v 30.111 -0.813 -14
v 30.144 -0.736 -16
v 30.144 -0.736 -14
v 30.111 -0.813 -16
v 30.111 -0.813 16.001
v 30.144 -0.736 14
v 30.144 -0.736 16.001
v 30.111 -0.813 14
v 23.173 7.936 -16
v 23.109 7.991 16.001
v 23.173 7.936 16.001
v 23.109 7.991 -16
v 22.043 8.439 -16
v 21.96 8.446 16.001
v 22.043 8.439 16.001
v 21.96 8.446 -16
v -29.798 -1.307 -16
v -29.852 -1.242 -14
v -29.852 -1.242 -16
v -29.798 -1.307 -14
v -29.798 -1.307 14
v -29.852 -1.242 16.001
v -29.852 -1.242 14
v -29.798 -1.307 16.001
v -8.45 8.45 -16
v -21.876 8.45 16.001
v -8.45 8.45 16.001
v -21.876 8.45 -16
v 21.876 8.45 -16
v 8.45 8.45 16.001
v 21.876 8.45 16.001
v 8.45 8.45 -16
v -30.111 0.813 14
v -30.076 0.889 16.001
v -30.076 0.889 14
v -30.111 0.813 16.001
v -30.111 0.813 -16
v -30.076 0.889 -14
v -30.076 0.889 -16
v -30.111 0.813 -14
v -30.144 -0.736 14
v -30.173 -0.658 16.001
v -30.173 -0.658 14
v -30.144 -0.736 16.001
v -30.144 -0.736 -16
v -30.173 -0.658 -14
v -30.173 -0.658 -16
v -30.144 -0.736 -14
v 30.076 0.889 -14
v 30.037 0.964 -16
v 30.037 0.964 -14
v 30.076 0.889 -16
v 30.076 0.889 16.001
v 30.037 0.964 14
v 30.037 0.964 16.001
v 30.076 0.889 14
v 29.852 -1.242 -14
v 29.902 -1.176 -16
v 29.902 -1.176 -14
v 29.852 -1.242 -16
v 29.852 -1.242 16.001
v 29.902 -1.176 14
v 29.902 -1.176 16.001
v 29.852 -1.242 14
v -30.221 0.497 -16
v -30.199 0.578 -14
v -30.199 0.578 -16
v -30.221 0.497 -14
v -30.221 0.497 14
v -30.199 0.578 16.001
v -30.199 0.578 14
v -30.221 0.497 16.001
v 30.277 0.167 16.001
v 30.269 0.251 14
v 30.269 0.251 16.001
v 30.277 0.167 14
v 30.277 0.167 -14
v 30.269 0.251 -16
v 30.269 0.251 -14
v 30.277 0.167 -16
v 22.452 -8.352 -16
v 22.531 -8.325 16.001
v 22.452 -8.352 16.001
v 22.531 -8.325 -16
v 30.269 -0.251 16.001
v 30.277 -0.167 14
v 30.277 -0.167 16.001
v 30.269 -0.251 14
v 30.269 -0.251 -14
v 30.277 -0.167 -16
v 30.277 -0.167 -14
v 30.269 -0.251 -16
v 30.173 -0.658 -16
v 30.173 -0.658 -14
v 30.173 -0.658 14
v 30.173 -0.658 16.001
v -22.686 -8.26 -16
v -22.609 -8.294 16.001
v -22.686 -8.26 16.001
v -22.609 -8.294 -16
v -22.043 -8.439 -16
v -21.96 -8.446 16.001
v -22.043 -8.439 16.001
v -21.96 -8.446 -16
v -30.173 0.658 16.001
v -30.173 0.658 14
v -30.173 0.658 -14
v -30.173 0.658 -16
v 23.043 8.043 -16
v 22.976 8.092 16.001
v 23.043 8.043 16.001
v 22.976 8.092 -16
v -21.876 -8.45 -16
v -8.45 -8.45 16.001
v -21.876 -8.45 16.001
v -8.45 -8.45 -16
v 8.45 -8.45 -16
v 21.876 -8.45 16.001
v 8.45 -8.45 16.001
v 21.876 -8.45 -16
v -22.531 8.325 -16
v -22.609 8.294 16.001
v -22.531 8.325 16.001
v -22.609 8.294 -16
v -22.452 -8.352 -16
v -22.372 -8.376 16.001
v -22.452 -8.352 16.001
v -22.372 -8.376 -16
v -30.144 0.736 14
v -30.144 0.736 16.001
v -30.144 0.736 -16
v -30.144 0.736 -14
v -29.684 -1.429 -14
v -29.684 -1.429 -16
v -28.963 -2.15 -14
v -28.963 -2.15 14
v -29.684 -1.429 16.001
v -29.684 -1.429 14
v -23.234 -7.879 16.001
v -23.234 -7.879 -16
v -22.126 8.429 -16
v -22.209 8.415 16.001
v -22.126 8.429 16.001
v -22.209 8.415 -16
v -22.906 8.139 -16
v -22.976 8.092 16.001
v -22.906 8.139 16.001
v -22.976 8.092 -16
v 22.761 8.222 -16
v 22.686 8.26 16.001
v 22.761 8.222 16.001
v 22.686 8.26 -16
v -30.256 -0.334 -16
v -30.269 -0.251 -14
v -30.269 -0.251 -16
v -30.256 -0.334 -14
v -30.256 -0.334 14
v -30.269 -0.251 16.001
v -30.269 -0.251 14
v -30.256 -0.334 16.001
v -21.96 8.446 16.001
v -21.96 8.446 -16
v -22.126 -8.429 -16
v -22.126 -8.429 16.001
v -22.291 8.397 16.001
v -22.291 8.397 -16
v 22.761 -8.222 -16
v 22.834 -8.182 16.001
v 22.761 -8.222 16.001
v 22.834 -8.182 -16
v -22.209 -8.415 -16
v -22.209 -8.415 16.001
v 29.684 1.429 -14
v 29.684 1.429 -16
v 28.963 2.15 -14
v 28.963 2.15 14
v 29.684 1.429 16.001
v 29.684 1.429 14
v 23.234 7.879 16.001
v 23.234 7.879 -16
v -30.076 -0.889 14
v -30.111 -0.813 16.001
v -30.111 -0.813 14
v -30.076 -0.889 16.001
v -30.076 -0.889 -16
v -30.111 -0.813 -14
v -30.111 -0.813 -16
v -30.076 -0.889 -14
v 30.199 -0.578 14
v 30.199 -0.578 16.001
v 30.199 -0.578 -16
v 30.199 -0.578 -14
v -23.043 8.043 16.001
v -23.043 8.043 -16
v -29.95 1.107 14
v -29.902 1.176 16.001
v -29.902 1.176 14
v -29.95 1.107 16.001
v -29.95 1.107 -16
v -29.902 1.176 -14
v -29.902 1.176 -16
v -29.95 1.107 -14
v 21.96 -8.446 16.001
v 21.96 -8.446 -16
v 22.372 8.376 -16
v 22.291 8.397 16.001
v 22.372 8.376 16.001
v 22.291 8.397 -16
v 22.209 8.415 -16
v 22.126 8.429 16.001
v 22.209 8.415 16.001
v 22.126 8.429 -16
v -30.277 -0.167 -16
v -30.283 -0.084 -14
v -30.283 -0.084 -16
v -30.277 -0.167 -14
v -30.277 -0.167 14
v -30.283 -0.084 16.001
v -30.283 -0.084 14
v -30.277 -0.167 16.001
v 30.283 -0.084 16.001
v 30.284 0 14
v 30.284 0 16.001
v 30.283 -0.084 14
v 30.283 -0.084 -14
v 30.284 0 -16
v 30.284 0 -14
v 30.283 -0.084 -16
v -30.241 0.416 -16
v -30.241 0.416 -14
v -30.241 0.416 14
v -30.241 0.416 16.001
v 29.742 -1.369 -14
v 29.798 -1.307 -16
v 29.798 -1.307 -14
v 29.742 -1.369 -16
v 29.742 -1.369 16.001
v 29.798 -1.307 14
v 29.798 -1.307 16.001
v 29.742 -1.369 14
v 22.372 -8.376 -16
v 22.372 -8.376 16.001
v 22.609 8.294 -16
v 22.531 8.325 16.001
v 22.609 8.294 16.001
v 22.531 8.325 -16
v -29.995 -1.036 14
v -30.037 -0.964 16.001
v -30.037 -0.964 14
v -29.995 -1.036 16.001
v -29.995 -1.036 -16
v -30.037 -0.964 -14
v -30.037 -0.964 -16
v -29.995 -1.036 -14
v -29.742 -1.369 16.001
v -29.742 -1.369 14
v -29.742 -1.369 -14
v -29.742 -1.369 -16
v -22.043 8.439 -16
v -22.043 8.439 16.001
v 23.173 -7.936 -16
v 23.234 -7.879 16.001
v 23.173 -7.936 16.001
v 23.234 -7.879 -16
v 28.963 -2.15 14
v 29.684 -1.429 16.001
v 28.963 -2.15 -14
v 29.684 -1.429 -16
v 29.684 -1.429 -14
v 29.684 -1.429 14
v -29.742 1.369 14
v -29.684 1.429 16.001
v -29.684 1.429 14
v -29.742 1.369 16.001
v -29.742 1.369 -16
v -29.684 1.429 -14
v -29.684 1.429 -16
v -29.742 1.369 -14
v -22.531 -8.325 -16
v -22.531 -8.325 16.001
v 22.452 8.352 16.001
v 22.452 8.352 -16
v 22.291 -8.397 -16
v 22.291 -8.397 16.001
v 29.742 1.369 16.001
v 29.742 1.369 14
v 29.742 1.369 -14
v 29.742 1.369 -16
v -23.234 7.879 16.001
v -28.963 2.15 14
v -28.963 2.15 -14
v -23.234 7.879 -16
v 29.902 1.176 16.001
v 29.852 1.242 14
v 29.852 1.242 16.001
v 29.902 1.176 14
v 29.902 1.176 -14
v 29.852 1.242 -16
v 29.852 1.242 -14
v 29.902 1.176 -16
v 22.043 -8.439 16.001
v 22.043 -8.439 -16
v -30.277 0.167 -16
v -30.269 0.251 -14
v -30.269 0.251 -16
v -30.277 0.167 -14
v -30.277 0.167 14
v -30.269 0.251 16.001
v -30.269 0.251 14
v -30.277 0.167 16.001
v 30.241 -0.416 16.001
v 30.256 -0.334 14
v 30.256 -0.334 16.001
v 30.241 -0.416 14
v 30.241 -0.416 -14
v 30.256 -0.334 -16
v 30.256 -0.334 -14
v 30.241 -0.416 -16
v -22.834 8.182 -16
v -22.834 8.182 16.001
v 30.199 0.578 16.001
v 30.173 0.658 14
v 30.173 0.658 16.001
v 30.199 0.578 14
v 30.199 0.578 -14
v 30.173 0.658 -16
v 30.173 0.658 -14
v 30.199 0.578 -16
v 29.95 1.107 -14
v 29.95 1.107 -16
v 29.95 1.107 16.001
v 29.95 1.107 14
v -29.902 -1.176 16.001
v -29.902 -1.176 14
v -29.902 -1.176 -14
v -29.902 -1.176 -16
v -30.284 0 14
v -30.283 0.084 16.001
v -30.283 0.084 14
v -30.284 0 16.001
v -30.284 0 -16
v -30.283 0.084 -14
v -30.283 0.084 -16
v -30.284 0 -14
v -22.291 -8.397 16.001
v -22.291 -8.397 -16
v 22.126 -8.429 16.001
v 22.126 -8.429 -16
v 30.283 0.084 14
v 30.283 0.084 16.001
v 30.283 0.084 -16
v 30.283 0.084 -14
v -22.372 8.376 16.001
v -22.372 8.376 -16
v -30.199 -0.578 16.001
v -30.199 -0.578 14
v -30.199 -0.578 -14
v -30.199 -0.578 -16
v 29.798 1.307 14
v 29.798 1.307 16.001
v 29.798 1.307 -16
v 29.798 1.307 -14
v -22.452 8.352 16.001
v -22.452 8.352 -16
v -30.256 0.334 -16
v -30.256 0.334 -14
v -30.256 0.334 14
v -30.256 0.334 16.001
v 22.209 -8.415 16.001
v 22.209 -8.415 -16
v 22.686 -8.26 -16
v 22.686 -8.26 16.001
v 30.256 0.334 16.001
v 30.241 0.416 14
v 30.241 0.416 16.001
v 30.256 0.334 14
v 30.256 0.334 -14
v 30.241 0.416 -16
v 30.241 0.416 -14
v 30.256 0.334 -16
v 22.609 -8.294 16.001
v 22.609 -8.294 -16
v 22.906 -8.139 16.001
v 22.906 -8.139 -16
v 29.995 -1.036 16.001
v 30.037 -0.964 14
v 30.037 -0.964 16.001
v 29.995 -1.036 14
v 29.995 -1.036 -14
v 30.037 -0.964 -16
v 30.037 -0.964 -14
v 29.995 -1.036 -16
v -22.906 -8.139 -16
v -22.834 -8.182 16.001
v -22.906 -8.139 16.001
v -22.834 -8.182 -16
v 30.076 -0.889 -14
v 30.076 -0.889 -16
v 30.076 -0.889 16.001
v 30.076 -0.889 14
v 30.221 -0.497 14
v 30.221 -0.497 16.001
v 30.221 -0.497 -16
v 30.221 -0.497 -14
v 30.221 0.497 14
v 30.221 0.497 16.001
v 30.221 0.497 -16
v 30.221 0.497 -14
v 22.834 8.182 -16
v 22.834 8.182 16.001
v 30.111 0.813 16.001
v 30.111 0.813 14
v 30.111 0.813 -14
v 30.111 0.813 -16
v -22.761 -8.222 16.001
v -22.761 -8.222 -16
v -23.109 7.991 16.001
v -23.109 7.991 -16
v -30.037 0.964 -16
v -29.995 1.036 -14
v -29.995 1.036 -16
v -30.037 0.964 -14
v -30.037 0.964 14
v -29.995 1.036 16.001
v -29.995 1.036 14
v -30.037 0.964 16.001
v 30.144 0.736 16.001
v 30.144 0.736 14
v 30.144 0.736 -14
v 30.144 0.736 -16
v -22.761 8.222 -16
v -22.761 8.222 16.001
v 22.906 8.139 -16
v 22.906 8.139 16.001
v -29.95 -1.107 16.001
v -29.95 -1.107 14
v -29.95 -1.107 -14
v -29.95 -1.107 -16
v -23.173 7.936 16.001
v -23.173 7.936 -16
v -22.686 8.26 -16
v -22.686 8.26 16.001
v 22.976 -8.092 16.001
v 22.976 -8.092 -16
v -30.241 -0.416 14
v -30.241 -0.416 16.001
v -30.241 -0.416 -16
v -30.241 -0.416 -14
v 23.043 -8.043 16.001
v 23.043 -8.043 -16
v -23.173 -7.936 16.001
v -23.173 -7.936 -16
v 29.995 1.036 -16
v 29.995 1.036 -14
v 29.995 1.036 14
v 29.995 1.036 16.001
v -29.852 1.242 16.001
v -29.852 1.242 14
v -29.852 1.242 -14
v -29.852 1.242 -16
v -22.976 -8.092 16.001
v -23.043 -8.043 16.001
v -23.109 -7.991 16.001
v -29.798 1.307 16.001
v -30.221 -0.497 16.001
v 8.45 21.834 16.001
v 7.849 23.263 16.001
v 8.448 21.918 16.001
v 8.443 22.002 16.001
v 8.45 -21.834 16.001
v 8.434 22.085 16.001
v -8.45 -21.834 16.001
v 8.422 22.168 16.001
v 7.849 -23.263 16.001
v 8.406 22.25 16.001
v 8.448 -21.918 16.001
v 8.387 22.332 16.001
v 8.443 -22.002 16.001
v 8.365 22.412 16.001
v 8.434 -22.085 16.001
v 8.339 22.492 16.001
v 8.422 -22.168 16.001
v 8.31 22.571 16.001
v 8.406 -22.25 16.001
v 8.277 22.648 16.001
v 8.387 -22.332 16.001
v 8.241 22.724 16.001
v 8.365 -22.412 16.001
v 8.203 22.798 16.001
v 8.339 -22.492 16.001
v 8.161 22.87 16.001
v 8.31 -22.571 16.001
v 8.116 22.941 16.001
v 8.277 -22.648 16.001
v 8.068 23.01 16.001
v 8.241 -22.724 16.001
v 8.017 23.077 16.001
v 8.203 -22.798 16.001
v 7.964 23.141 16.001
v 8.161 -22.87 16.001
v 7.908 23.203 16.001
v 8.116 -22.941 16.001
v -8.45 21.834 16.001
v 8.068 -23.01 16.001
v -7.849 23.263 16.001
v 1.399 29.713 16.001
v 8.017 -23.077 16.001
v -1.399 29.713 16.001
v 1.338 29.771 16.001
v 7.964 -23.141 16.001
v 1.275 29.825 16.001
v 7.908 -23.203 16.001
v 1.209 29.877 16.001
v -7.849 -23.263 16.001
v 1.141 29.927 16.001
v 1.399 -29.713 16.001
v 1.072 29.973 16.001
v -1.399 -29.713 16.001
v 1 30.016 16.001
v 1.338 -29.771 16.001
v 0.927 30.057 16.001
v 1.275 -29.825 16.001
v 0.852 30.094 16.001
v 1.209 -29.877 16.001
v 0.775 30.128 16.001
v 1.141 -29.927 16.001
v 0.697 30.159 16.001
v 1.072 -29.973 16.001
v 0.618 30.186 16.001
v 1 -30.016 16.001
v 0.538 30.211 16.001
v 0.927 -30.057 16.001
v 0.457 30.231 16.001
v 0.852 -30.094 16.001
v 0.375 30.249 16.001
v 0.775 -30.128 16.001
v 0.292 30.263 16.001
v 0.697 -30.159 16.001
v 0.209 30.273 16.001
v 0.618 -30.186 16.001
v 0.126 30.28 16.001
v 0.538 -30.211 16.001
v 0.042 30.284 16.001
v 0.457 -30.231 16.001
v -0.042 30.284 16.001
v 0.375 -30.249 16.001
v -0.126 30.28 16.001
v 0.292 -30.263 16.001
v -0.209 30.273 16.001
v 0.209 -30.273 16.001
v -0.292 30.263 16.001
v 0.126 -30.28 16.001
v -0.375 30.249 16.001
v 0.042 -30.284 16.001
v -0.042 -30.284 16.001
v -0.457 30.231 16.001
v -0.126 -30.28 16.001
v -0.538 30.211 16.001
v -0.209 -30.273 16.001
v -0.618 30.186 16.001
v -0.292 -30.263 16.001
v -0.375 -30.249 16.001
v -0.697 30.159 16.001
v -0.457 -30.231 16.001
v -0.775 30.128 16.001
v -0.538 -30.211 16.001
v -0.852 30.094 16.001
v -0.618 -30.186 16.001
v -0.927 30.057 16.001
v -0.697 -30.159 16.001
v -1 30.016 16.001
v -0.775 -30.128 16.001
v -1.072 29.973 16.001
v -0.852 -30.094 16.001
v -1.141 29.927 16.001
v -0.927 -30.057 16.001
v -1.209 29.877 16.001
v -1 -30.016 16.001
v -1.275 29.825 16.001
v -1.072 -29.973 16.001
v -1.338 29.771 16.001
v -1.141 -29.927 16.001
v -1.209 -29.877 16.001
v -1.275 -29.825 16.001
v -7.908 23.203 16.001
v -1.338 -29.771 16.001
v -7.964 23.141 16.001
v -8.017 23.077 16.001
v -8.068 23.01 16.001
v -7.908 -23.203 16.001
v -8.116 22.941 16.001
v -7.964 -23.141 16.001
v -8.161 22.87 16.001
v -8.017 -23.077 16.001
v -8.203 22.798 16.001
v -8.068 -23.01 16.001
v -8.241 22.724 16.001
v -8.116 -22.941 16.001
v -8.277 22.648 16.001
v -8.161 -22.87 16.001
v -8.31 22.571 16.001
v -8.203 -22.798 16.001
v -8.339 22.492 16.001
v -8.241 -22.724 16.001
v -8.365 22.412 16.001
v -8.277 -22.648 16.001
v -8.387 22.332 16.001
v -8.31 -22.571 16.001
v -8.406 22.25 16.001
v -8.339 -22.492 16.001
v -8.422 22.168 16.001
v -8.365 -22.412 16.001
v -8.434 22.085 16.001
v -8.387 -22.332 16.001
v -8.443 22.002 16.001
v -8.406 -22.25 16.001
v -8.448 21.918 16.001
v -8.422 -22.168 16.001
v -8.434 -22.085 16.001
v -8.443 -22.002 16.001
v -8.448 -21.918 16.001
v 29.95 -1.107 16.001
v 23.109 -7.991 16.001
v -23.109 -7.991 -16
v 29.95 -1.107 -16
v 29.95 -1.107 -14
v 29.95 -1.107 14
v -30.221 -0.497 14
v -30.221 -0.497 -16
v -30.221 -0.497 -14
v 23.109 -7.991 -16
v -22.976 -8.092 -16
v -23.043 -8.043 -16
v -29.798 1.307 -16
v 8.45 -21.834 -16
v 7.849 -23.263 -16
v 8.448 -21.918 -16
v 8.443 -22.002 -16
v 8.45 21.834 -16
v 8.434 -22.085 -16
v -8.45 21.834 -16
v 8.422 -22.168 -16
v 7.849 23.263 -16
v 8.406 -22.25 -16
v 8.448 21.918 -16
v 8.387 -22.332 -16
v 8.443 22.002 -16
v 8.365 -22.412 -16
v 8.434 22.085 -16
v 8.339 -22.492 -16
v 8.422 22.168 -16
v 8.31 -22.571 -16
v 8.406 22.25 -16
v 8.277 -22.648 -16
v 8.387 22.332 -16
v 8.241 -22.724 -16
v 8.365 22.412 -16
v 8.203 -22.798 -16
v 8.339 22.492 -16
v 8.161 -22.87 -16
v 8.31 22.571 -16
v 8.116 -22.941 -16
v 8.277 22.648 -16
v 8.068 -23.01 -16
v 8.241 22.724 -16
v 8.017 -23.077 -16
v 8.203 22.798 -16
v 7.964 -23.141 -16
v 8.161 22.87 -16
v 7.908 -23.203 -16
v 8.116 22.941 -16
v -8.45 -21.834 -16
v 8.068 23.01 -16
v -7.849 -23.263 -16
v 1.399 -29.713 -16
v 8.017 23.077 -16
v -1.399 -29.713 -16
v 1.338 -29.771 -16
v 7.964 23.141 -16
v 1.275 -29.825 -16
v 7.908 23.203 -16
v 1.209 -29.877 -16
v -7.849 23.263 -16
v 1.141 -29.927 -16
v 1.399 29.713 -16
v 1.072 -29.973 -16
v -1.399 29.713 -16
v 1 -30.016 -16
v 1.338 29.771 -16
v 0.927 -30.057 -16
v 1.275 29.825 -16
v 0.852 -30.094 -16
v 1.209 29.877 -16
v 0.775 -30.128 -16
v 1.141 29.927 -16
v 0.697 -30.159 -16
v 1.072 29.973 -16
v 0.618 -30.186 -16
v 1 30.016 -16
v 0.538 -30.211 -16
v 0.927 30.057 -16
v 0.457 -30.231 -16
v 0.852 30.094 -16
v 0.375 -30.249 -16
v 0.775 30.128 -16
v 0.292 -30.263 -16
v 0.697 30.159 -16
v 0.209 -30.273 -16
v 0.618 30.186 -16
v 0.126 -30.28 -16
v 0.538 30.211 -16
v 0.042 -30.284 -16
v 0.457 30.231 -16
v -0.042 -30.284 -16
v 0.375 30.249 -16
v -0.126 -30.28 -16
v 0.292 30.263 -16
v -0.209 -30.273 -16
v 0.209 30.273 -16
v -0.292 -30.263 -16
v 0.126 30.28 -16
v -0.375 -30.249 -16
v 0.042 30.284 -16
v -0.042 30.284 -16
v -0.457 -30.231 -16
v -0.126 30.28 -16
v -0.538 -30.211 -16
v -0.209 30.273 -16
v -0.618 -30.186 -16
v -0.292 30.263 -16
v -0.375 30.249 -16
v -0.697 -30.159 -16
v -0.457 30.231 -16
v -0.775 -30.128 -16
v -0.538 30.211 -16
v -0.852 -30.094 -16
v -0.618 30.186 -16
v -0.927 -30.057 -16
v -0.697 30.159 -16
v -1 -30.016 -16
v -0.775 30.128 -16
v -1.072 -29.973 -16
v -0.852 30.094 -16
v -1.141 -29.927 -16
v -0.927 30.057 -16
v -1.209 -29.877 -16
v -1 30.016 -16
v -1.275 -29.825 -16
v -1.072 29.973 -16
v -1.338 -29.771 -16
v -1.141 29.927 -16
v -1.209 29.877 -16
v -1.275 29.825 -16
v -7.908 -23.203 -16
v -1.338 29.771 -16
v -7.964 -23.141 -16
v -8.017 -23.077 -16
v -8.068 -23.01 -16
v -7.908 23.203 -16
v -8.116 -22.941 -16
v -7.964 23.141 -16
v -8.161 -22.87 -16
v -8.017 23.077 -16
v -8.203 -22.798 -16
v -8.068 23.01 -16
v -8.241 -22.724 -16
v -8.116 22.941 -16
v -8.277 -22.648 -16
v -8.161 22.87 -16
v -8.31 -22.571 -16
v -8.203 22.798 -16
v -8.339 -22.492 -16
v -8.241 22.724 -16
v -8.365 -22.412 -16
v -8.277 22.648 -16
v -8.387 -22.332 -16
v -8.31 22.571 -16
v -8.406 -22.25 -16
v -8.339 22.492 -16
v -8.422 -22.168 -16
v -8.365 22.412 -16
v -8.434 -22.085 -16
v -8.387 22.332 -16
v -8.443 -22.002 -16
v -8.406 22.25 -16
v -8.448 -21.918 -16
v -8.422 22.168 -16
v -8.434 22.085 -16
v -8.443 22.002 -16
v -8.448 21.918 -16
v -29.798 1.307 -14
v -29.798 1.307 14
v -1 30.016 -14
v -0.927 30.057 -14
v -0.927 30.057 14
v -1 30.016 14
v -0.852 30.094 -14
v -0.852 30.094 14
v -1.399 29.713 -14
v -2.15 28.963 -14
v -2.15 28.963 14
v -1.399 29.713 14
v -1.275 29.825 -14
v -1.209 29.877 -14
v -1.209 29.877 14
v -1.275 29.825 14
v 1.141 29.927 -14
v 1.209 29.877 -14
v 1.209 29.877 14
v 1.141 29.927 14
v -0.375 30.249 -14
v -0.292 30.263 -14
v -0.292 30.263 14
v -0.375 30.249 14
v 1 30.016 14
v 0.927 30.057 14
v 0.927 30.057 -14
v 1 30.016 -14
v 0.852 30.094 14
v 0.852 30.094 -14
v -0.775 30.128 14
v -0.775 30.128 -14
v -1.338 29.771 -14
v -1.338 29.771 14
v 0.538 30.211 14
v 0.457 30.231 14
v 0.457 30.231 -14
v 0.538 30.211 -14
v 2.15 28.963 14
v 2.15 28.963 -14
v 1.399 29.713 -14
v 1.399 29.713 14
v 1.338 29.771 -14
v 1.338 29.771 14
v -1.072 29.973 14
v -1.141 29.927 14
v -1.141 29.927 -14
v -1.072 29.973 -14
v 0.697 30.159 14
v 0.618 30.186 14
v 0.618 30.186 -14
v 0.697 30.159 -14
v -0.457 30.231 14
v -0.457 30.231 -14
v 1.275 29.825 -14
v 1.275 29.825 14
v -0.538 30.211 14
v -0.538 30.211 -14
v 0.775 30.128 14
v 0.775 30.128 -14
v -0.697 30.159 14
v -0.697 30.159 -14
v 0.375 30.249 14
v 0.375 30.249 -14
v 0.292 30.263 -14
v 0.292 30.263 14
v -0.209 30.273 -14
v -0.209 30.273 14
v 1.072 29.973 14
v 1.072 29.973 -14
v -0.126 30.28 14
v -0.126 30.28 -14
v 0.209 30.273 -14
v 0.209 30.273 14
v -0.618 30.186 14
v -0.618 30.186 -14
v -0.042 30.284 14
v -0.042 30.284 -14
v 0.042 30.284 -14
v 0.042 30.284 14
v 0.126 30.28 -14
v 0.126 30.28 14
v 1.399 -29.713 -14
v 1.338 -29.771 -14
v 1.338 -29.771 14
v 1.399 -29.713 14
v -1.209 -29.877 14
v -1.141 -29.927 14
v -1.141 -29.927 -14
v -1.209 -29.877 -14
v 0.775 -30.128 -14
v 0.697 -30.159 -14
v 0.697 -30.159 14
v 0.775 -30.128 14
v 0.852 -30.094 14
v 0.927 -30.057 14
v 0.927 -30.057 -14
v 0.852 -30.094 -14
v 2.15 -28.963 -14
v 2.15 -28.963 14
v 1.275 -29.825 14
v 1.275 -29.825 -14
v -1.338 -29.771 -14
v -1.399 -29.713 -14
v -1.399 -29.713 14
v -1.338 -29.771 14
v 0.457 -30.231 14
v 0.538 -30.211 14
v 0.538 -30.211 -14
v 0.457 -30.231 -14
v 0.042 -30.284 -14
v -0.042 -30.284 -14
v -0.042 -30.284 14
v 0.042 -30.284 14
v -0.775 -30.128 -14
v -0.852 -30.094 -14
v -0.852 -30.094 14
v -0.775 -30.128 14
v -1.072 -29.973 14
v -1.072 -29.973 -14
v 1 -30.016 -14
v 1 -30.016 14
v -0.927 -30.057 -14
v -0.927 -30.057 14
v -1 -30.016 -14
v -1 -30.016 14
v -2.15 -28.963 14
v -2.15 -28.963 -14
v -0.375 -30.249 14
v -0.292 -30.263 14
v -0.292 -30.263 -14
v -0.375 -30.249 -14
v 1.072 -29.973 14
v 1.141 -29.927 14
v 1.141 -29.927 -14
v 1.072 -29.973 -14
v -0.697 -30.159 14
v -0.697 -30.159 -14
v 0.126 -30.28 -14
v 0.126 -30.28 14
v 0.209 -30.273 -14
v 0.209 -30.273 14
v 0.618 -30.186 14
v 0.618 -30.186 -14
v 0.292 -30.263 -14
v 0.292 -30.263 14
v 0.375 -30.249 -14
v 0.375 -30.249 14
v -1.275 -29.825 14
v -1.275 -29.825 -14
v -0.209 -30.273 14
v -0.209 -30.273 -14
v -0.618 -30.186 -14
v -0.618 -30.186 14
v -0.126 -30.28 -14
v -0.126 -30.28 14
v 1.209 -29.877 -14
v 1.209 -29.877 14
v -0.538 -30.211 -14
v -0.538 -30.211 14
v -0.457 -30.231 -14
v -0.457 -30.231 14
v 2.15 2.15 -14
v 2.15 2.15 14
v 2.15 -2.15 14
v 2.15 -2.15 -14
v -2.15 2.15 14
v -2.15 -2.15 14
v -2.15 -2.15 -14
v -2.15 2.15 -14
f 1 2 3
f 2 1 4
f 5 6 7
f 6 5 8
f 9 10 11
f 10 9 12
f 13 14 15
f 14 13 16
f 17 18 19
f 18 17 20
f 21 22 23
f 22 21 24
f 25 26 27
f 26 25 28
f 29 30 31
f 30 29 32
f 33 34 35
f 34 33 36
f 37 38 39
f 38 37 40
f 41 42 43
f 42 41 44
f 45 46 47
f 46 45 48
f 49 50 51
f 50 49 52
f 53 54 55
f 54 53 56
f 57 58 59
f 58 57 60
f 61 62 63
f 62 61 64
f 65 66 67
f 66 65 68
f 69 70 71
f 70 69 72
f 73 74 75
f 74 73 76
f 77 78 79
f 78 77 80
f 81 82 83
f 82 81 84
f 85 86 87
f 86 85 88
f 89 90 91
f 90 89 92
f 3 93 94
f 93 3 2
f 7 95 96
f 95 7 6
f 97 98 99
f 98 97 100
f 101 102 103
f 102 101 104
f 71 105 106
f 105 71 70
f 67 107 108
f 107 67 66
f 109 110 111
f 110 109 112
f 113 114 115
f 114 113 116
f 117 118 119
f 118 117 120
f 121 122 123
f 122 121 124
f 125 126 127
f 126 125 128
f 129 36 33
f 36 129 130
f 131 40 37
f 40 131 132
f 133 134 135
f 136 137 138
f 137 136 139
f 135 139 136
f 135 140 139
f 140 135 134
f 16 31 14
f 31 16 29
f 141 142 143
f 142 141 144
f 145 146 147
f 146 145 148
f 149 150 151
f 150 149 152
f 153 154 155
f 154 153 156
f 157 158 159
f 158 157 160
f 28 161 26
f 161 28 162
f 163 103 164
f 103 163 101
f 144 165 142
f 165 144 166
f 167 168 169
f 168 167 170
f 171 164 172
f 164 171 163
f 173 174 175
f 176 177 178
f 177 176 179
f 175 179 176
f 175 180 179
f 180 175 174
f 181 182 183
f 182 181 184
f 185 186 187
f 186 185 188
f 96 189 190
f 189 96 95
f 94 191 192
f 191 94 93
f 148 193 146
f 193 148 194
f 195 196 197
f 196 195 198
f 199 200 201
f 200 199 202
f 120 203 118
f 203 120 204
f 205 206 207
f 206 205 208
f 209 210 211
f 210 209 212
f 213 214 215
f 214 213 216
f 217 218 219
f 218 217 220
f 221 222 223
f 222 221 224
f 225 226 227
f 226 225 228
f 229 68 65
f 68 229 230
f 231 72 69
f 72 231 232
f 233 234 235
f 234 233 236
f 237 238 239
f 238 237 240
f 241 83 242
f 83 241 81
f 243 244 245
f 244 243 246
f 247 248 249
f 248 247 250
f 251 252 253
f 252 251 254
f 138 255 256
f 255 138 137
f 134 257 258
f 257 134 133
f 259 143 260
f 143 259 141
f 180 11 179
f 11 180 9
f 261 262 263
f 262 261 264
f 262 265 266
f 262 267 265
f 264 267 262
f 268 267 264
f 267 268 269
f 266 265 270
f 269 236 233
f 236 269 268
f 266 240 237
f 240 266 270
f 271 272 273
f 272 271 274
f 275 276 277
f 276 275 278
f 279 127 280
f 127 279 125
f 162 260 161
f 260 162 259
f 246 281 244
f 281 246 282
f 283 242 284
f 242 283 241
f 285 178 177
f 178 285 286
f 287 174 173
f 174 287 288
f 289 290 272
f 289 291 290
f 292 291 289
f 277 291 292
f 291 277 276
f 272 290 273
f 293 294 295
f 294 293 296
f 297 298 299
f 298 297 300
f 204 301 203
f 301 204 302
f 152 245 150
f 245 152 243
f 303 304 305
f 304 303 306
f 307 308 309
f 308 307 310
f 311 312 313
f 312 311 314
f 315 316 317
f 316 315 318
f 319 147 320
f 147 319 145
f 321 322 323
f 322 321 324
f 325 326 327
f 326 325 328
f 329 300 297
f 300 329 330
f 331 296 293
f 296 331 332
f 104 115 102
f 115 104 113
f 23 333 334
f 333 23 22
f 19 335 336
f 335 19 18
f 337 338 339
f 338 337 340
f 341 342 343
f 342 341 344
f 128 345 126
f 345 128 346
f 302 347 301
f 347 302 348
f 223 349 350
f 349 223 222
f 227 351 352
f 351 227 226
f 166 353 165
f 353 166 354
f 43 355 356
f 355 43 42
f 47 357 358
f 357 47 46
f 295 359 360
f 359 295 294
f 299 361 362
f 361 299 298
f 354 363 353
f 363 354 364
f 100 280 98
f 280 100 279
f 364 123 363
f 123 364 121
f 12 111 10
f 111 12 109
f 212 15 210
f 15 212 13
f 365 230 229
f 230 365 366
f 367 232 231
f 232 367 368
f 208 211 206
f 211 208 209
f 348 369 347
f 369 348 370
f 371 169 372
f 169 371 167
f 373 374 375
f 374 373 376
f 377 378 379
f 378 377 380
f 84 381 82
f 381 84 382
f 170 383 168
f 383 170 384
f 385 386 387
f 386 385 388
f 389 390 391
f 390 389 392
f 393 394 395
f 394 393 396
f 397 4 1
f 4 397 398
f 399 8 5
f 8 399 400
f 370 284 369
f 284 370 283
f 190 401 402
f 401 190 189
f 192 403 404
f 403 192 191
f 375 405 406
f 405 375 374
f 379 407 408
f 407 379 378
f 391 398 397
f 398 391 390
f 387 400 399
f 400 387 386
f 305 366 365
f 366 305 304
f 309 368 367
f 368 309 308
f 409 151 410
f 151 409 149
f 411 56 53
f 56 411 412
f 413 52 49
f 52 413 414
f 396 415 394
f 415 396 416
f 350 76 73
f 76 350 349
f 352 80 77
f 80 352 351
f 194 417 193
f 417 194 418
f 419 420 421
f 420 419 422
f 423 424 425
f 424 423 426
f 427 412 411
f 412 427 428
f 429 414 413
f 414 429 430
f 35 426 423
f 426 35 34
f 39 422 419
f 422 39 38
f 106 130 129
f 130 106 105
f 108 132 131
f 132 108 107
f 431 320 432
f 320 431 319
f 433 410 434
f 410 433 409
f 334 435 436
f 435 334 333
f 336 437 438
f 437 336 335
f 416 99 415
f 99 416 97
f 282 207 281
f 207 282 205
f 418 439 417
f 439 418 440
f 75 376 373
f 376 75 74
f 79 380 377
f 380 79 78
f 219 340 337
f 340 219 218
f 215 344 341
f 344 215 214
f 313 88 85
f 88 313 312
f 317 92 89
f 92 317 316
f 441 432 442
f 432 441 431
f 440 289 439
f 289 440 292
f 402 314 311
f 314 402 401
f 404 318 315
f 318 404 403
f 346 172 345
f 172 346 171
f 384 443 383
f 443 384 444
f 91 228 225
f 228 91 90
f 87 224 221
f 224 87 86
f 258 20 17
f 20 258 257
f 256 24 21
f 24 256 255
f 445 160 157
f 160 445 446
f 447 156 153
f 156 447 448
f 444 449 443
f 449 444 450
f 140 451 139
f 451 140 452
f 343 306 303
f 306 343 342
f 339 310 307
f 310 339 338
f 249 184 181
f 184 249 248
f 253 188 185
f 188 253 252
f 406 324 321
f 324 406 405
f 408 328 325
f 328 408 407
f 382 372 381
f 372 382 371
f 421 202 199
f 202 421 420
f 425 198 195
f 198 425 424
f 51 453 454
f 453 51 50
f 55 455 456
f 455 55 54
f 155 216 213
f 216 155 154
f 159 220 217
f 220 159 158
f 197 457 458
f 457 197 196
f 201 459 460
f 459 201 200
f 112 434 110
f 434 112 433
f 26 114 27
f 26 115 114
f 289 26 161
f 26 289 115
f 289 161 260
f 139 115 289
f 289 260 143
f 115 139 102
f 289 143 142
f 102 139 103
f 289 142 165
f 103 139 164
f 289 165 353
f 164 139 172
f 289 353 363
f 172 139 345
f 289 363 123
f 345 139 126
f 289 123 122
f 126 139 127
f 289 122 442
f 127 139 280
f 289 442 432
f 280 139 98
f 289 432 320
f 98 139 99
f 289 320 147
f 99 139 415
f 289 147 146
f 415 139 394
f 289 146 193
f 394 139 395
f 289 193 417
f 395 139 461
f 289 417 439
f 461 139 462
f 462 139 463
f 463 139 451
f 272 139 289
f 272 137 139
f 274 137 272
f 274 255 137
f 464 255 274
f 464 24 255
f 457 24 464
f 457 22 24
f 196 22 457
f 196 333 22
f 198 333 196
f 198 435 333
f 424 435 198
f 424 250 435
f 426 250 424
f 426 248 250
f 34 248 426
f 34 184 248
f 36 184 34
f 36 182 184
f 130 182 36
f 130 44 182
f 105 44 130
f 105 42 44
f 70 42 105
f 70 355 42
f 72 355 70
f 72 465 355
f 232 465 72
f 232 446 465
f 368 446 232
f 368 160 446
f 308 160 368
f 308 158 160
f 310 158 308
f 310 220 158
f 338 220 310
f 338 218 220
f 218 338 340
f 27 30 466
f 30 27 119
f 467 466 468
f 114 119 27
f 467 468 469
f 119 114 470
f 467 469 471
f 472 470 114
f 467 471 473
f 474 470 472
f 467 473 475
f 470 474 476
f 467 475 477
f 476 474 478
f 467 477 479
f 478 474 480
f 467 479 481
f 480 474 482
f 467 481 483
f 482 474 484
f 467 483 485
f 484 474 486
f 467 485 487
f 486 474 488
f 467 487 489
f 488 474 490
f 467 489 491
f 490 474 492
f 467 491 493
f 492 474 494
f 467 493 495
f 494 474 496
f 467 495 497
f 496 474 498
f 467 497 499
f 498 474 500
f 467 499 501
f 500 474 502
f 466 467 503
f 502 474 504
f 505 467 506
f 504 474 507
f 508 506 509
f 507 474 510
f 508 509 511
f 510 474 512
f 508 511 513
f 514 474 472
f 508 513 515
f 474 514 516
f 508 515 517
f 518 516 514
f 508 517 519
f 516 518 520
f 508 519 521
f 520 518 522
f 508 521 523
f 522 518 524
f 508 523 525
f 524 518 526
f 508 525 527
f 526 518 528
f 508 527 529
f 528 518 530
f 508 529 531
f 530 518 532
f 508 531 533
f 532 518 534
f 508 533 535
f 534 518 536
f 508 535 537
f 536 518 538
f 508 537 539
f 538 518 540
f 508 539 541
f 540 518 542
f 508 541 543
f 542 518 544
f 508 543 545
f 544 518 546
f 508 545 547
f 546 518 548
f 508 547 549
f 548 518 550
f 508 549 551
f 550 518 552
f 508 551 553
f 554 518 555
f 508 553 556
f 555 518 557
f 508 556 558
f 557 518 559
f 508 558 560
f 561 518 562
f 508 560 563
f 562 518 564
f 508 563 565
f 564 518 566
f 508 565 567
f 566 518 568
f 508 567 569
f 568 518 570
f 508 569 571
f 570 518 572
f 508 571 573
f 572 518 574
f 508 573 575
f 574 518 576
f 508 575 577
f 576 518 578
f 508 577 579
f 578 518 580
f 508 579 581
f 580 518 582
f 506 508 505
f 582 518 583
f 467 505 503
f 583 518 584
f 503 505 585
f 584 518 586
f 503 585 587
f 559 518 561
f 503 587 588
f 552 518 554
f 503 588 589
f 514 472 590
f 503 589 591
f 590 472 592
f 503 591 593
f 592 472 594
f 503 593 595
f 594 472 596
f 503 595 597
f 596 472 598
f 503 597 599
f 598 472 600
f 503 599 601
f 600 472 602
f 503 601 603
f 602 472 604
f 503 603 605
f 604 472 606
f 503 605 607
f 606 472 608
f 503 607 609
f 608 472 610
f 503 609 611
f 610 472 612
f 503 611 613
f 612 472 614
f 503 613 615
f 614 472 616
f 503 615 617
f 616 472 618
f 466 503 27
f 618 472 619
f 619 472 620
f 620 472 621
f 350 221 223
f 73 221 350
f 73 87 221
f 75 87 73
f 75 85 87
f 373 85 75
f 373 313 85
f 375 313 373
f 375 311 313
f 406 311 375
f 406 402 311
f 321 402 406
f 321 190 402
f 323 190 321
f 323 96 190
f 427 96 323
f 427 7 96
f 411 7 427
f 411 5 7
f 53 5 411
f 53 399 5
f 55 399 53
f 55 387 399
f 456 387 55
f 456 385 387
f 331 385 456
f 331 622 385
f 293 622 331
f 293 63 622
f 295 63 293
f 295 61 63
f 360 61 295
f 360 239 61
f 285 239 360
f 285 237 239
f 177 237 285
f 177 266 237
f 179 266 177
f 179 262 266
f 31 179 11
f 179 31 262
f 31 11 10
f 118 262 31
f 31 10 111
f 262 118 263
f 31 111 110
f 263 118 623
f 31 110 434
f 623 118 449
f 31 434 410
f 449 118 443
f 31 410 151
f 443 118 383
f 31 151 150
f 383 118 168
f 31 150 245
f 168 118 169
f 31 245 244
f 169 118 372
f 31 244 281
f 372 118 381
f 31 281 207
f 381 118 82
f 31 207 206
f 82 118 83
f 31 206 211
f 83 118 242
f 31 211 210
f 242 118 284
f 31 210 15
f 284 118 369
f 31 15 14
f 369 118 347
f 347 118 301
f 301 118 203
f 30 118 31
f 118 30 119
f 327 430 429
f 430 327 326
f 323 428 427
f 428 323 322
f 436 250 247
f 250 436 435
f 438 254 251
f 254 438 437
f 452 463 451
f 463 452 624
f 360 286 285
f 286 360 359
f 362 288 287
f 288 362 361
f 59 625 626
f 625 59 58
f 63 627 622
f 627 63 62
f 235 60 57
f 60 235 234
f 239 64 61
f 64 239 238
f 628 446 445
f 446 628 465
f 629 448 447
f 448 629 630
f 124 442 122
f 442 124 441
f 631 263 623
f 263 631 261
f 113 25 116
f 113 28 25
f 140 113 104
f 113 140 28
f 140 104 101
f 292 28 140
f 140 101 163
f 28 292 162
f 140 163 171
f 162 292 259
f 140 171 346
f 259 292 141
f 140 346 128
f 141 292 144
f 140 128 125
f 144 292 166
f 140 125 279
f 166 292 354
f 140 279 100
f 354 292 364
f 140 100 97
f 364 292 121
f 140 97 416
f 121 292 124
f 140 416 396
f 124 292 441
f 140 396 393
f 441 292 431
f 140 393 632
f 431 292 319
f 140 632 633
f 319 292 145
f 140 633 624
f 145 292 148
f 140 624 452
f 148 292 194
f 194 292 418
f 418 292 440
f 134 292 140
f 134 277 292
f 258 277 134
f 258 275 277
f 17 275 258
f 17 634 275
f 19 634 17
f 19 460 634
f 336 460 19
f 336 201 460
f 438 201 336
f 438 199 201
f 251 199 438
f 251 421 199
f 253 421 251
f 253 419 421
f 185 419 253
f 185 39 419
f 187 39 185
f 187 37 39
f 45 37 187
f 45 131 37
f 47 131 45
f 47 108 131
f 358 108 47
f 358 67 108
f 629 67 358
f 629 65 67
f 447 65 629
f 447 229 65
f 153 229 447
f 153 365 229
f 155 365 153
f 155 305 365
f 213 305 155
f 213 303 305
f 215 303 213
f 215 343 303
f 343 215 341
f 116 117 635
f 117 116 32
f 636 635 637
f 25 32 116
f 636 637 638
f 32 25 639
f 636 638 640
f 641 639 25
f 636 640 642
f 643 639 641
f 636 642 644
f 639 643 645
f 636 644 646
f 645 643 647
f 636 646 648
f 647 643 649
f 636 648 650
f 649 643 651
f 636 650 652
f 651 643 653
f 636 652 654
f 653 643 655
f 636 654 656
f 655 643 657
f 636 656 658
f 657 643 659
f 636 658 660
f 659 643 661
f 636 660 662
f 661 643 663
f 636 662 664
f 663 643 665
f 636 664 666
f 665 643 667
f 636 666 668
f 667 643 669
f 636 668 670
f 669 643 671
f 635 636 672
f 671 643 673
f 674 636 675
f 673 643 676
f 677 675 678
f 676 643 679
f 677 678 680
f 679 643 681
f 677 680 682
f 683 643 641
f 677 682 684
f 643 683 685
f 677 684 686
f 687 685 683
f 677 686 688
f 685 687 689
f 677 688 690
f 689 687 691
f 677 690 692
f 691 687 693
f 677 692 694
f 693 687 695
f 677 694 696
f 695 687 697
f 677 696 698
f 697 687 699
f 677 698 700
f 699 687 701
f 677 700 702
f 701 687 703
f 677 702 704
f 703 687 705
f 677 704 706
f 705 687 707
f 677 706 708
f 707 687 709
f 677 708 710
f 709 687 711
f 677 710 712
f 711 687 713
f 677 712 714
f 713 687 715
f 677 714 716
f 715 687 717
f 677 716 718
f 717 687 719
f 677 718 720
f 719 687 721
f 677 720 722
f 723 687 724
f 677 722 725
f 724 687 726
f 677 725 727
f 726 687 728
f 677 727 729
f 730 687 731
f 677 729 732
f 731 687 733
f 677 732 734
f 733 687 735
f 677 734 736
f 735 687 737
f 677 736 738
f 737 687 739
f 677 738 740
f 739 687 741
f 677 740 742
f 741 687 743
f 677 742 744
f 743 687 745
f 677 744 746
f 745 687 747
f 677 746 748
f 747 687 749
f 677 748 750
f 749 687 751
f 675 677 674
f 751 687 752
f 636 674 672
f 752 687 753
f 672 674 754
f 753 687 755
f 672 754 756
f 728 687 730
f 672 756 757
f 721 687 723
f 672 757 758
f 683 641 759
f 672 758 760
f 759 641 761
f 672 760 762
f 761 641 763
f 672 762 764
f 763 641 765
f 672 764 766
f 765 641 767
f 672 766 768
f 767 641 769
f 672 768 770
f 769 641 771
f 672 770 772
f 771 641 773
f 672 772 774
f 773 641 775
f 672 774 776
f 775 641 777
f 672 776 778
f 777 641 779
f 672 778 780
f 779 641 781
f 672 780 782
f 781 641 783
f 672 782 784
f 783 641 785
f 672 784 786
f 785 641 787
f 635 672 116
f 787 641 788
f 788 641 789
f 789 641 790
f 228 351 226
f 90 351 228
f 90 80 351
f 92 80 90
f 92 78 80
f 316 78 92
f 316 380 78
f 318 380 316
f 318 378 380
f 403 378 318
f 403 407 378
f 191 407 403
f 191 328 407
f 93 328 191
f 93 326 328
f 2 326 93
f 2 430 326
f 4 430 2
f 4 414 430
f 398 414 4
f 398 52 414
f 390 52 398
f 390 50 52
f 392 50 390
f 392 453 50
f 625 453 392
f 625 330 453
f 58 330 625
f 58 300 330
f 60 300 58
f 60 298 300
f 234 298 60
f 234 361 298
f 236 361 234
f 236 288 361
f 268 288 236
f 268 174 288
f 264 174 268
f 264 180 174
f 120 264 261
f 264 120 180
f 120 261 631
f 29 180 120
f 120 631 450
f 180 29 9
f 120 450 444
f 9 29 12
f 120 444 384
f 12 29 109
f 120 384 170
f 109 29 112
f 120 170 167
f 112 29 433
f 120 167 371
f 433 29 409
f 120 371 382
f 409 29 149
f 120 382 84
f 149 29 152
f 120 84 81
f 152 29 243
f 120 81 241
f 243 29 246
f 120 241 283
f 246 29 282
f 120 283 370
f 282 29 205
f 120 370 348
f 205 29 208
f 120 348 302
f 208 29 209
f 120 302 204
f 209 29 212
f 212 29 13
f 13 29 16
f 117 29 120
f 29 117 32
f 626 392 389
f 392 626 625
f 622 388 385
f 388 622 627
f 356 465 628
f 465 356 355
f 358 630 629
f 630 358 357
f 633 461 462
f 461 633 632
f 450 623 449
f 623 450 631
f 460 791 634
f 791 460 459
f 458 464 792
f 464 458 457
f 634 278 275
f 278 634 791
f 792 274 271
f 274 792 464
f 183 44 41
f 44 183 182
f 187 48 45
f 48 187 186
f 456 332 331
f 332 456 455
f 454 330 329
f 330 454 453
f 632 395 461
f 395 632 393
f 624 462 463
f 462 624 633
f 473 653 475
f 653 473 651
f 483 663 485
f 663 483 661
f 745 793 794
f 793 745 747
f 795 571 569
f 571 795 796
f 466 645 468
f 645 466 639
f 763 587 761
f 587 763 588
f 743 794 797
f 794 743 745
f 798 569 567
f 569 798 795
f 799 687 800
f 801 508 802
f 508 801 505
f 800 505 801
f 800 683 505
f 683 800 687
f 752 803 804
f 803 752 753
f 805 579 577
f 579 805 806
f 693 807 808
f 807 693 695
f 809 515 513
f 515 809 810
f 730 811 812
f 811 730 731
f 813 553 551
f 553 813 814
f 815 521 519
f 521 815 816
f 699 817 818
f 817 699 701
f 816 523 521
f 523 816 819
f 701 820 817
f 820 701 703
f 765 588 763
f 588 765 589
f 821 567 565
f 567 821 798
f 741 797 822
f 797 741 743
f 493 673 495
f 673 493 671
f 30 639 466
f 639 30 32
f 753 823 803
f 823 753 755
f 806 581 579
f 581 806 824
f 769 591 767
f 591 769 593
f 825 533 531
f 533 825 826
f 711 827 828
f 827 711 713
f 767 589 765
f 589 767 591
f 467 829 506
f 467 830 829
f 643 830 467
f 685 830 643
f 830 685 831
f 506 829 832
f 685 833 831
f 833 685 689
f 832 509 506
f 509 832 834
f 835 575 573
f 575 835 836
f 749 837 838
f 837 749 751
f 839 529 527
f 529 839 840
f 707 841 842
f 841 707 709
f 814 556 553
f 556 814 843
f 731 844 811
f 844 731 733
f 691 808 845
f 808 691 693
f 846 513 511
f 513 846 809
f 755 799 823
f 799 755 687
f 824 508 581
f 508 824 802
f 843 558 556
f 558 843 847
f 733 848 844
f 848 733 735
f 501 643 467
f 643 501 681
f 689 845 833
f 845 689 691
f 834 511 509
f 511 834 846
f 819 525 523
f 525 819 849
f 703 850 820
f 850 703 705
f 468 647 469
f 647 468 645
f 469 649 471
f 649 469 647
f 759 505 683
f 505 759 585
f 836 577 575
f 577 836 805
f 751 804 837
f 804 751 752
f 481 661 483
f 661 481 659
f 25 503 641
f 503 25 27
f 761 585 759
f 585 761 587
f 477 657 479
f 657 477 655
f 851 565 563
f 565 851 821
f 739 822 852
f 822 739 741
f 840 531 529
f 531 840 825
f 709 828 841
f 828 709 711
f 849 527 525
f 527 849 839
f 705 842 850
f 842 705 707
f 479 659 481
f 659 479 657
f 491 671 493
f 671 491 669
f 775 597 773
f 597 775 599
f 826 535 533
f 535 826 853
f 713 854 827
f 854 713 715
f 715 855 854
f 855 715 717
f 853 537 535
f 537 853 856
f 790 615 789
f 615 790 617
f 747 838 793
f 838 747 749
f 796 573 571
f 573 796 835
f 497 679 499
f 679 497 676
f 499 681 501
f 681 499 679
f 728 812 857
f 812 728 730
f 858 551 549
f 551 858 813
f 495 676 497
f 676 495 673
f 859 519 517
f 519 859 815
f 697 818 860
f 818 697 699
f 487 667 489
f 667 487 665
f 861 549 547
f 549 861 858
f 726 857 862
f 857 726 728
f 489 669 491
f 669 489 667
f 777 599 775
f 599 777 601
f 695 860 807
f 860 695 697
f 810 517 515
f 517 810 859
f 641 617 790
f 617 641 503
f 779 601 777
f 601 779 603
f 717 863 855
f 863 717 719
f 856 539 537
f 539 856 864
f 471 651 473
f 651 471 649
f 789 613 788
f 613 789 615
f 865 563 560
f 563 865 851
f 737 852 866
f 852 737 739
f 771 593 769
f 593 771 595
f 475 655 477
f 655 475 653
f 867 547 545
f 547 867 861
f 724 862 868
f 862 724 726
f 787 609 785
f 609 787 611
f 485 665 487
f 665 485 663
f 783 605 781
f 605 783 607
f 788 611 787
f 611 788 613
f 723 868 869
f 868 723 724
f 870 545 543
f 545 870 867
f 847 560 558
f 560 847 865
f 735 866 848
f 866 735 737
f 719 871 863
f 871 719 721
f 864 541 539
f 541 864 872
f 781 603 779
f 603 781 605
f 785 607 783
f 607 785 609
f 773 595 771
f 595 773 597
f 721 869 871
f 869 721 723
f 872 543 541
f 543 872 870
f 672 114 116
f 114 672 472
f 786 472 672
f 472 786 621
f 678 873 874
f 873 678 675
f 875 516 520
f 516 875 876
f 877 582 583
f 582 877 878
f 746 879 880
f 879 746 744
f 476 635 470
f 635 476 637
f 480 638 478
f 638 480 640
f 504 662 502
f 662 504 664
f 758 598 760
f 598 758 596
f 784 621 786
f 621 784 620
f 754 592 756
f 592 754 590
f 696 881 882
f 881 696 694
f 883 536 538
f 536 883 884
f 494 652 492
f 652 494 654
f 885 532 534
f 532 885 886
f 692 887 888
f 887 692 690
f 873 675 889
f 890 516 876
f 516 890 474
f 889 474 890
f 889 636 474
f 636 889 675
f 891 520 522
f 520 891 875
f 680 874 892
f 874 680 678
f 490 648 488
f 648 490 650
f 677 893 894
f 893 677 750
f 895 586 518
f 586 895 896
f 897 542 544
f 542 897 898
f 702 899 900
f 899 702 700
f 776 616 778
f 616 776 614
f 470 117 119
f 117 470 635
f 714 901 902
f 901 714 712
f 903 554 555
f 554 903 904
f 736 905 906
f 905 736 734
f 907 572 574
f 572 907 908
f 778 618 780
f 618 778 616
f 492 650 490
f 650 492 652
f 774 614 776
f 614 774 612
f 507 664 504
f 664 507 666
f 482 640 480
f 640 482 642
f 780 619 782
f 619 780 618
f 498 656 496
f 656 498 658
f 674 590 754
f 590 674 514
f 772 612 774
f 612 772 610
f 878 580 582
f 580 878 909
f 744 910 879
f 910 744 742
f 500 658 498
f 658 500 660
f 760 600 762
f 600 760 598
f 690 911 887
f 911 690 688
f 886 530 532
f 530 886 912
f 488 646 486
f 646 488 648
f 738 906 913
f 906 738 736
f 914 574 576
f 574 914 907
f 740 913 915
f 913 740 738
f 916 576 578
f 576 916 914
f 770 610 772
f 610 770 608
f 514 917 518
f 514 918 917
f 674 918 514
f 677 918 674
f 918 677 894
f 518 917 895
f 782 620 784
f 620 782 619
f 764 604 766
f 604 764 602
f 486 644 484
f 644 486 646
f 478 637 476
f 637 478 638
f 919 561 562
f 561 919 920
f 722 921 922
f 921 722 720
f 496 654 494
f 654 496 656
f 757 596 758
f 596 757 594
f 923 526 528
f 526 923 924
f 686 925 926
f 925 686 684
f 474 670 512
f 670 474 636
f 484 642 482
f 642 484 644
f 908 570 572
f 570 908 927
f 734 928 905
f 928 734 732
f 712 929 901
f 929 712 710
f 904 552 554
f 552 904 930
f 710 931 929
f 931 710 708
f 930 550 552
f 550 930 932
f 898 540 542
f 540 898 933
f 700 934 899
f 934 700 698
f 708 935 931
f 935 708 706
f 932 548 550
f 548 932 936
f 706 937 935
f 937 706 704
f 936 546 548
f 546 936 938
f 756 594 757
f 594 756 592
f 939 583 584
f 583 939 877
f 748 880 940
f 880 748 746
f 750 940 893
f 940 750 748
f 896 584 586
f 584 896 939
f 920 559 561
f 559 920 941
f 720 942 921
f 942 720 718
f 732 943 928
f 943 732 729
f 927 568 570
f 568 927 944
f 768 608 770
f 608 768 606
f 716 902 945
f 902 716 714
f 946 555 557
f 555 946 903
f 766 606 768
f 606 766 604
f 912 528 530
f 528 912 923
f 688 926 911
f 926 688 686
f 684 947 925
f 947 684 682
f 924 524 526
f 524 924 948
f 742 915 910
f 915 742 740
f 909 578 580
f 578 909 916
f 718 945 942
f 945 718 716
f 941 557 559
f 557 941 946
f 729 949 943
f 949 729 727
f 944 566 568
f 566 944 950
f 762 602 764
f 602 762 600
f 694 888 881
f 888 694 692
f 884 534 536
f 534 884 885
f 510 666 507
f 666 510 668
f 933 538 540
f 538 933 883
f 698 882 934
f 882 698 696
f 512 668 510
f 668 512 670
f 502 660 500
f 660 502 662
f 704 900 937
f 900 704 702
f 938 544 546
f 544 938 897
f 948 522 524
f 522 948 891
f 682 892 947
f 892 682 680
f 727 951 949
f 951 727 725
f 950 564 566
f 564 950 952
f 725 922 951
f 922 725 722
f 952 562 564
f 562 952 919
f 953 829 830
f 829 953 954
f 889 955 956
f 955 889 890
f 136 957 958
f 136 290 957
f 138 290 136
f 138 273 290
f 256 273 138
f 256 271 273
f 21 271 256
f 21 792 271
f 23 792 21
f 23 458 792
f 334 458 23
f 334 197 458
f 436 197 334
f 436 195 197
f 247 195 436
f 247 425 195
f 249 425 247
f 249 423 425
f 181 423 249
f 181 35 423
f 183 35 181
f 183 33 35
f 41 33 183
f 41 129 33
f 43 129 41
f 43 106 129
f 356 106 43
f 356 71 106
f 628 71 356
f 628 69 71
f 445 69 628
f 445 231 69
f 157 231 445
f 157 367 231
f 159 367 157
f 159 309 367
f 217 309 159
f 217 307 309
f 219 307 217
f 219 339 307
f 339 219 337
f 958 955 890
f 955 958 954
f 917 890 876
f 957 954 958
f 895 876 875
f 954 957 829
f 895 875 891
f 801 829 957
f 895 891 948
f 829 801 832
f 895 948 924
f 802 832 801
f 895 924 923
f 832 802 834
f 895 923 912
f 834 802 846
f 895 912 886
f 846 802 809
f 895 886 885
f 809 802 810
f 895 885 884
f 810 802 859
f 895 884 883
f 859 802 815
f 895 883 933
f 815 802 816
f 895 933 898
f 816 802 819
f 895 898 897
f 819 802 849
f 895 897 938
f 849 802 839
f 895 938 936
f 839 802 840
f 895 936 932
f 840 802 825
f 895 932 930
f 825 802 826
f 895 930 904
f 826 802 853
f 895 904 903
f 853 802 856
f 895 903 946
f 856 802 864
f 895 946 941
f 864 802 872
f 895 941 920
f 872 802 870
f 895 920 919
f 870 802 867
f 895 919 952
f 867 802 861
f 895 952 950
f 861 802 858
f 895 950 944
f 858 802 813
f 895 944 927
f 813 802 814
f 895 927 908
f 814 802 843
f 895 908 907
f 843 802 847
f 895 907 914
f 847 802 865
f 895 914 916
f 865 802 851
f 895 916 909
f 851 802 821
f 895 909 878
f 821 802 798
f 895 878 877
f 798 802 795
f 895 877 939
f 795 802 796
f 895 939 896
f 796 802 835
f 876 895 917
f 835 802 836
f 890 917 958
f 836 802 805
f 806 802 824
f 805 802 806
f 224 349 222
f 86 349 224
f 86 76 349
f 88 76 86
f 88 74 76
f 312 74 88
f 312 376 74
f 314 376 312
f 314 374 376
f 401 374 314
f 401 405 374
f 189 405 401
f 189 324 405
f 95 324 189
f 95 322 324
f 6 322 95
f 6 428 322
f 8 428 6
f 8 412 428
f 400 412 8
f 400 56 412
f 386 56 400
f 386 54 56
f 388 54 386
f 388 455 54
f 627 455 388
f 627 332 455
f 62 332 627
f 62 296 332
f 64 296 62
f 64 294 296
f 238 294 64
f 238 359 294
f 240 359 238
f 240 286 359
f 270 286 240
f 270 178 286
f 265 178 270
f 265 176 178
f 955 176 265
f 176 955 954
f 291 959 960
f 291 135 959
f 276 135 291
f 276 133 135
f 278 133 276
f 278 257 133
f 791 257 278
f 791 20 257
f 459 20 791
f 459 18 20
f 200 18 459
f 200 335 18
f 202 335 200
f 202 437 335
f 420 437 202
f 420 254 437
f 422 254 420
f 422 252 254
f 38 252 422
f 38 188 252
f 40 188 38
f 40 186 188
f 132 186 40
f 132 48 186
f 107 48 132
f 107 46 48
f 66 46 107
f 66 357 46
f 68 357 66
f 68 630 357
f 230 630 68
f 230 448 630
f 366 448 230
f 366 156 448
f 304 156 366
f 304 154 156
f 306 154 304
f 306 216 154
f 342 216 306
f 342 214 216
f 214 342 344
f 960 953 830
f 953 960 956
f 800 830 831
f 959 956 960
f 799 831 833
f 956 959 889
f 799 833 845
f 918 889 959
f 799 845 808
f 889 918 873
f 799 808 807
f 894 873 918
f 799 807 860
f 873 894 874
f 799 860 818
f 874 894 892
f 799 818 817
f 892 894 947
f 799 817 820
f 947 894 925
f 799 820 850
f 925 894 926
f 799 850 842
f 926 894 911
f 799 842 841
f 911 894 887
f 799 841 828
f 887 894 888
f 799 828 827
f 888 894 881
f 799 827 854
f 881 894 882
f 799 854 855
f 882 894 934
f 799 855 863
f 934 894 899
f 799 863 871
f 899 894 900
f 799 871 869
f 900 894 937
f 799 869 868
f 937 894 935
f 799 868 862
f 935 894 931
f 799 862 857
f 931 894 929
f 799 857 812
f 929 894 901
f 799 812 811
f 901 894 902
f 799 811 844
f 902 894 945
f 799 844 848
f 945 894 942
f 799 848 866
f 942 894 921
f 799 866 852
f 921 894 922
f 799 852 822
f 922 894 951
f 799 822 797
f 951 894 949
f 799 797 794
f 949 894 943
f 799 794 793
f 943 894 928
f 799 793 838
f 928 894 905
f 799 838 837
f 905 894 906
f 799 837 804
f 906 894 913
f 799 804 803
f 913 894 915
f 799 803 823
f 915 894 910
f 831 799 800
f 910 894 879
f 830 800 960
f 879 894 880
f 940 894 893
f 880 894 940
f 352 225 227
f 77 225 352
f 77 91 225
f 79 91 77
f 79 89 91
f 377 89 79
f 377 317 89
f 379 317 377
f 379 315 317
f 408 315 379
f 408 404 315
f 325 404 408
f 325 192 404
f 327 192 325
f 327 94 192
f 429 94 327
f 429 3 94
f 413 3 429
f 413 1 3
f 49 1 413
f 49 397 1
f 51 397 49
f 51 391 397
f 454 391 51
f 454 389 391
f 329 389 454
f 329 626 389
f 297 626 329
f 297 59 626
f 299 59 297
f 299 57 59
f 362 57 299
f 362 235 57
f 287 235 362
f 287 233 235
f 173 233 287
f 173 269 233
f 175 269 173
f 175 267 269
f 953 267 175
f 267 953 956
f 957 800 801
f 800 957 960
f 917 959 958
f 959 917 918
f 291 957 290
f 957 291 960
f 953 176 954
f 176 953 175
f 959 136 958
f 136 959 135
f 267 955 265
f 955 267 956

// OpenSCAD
//Yardstick/ruler loop antenna center
$fn = ($preview)?25:150;


body_side = 40;
plate_thickness = 2; 

slot_width = 4.3;
slot_depth = 28;


fillet = 2;

difference() {
	minkowski() {
		difference() {
			rotate(45, [0,0,1]) {
				cube([body_side, body_side, slot_depth + 2*plate_thickness], center = true);
			}
			for(angle = [0, 90, 180, 270]) {
				rotate(angle, [0,0,1]) translate([slot_width * 1.5, slot_width * 1.5, -slot_depth-plate_thickness/2]) cube(2*body_side);
			}
		}
		cylinder(0.001, r=fillet);
	}
	
	cube([slot_width, body_side*2, slot_depth], center = true);
	cube([body_side*2, slot_width, slot_depth], center = true);
}
